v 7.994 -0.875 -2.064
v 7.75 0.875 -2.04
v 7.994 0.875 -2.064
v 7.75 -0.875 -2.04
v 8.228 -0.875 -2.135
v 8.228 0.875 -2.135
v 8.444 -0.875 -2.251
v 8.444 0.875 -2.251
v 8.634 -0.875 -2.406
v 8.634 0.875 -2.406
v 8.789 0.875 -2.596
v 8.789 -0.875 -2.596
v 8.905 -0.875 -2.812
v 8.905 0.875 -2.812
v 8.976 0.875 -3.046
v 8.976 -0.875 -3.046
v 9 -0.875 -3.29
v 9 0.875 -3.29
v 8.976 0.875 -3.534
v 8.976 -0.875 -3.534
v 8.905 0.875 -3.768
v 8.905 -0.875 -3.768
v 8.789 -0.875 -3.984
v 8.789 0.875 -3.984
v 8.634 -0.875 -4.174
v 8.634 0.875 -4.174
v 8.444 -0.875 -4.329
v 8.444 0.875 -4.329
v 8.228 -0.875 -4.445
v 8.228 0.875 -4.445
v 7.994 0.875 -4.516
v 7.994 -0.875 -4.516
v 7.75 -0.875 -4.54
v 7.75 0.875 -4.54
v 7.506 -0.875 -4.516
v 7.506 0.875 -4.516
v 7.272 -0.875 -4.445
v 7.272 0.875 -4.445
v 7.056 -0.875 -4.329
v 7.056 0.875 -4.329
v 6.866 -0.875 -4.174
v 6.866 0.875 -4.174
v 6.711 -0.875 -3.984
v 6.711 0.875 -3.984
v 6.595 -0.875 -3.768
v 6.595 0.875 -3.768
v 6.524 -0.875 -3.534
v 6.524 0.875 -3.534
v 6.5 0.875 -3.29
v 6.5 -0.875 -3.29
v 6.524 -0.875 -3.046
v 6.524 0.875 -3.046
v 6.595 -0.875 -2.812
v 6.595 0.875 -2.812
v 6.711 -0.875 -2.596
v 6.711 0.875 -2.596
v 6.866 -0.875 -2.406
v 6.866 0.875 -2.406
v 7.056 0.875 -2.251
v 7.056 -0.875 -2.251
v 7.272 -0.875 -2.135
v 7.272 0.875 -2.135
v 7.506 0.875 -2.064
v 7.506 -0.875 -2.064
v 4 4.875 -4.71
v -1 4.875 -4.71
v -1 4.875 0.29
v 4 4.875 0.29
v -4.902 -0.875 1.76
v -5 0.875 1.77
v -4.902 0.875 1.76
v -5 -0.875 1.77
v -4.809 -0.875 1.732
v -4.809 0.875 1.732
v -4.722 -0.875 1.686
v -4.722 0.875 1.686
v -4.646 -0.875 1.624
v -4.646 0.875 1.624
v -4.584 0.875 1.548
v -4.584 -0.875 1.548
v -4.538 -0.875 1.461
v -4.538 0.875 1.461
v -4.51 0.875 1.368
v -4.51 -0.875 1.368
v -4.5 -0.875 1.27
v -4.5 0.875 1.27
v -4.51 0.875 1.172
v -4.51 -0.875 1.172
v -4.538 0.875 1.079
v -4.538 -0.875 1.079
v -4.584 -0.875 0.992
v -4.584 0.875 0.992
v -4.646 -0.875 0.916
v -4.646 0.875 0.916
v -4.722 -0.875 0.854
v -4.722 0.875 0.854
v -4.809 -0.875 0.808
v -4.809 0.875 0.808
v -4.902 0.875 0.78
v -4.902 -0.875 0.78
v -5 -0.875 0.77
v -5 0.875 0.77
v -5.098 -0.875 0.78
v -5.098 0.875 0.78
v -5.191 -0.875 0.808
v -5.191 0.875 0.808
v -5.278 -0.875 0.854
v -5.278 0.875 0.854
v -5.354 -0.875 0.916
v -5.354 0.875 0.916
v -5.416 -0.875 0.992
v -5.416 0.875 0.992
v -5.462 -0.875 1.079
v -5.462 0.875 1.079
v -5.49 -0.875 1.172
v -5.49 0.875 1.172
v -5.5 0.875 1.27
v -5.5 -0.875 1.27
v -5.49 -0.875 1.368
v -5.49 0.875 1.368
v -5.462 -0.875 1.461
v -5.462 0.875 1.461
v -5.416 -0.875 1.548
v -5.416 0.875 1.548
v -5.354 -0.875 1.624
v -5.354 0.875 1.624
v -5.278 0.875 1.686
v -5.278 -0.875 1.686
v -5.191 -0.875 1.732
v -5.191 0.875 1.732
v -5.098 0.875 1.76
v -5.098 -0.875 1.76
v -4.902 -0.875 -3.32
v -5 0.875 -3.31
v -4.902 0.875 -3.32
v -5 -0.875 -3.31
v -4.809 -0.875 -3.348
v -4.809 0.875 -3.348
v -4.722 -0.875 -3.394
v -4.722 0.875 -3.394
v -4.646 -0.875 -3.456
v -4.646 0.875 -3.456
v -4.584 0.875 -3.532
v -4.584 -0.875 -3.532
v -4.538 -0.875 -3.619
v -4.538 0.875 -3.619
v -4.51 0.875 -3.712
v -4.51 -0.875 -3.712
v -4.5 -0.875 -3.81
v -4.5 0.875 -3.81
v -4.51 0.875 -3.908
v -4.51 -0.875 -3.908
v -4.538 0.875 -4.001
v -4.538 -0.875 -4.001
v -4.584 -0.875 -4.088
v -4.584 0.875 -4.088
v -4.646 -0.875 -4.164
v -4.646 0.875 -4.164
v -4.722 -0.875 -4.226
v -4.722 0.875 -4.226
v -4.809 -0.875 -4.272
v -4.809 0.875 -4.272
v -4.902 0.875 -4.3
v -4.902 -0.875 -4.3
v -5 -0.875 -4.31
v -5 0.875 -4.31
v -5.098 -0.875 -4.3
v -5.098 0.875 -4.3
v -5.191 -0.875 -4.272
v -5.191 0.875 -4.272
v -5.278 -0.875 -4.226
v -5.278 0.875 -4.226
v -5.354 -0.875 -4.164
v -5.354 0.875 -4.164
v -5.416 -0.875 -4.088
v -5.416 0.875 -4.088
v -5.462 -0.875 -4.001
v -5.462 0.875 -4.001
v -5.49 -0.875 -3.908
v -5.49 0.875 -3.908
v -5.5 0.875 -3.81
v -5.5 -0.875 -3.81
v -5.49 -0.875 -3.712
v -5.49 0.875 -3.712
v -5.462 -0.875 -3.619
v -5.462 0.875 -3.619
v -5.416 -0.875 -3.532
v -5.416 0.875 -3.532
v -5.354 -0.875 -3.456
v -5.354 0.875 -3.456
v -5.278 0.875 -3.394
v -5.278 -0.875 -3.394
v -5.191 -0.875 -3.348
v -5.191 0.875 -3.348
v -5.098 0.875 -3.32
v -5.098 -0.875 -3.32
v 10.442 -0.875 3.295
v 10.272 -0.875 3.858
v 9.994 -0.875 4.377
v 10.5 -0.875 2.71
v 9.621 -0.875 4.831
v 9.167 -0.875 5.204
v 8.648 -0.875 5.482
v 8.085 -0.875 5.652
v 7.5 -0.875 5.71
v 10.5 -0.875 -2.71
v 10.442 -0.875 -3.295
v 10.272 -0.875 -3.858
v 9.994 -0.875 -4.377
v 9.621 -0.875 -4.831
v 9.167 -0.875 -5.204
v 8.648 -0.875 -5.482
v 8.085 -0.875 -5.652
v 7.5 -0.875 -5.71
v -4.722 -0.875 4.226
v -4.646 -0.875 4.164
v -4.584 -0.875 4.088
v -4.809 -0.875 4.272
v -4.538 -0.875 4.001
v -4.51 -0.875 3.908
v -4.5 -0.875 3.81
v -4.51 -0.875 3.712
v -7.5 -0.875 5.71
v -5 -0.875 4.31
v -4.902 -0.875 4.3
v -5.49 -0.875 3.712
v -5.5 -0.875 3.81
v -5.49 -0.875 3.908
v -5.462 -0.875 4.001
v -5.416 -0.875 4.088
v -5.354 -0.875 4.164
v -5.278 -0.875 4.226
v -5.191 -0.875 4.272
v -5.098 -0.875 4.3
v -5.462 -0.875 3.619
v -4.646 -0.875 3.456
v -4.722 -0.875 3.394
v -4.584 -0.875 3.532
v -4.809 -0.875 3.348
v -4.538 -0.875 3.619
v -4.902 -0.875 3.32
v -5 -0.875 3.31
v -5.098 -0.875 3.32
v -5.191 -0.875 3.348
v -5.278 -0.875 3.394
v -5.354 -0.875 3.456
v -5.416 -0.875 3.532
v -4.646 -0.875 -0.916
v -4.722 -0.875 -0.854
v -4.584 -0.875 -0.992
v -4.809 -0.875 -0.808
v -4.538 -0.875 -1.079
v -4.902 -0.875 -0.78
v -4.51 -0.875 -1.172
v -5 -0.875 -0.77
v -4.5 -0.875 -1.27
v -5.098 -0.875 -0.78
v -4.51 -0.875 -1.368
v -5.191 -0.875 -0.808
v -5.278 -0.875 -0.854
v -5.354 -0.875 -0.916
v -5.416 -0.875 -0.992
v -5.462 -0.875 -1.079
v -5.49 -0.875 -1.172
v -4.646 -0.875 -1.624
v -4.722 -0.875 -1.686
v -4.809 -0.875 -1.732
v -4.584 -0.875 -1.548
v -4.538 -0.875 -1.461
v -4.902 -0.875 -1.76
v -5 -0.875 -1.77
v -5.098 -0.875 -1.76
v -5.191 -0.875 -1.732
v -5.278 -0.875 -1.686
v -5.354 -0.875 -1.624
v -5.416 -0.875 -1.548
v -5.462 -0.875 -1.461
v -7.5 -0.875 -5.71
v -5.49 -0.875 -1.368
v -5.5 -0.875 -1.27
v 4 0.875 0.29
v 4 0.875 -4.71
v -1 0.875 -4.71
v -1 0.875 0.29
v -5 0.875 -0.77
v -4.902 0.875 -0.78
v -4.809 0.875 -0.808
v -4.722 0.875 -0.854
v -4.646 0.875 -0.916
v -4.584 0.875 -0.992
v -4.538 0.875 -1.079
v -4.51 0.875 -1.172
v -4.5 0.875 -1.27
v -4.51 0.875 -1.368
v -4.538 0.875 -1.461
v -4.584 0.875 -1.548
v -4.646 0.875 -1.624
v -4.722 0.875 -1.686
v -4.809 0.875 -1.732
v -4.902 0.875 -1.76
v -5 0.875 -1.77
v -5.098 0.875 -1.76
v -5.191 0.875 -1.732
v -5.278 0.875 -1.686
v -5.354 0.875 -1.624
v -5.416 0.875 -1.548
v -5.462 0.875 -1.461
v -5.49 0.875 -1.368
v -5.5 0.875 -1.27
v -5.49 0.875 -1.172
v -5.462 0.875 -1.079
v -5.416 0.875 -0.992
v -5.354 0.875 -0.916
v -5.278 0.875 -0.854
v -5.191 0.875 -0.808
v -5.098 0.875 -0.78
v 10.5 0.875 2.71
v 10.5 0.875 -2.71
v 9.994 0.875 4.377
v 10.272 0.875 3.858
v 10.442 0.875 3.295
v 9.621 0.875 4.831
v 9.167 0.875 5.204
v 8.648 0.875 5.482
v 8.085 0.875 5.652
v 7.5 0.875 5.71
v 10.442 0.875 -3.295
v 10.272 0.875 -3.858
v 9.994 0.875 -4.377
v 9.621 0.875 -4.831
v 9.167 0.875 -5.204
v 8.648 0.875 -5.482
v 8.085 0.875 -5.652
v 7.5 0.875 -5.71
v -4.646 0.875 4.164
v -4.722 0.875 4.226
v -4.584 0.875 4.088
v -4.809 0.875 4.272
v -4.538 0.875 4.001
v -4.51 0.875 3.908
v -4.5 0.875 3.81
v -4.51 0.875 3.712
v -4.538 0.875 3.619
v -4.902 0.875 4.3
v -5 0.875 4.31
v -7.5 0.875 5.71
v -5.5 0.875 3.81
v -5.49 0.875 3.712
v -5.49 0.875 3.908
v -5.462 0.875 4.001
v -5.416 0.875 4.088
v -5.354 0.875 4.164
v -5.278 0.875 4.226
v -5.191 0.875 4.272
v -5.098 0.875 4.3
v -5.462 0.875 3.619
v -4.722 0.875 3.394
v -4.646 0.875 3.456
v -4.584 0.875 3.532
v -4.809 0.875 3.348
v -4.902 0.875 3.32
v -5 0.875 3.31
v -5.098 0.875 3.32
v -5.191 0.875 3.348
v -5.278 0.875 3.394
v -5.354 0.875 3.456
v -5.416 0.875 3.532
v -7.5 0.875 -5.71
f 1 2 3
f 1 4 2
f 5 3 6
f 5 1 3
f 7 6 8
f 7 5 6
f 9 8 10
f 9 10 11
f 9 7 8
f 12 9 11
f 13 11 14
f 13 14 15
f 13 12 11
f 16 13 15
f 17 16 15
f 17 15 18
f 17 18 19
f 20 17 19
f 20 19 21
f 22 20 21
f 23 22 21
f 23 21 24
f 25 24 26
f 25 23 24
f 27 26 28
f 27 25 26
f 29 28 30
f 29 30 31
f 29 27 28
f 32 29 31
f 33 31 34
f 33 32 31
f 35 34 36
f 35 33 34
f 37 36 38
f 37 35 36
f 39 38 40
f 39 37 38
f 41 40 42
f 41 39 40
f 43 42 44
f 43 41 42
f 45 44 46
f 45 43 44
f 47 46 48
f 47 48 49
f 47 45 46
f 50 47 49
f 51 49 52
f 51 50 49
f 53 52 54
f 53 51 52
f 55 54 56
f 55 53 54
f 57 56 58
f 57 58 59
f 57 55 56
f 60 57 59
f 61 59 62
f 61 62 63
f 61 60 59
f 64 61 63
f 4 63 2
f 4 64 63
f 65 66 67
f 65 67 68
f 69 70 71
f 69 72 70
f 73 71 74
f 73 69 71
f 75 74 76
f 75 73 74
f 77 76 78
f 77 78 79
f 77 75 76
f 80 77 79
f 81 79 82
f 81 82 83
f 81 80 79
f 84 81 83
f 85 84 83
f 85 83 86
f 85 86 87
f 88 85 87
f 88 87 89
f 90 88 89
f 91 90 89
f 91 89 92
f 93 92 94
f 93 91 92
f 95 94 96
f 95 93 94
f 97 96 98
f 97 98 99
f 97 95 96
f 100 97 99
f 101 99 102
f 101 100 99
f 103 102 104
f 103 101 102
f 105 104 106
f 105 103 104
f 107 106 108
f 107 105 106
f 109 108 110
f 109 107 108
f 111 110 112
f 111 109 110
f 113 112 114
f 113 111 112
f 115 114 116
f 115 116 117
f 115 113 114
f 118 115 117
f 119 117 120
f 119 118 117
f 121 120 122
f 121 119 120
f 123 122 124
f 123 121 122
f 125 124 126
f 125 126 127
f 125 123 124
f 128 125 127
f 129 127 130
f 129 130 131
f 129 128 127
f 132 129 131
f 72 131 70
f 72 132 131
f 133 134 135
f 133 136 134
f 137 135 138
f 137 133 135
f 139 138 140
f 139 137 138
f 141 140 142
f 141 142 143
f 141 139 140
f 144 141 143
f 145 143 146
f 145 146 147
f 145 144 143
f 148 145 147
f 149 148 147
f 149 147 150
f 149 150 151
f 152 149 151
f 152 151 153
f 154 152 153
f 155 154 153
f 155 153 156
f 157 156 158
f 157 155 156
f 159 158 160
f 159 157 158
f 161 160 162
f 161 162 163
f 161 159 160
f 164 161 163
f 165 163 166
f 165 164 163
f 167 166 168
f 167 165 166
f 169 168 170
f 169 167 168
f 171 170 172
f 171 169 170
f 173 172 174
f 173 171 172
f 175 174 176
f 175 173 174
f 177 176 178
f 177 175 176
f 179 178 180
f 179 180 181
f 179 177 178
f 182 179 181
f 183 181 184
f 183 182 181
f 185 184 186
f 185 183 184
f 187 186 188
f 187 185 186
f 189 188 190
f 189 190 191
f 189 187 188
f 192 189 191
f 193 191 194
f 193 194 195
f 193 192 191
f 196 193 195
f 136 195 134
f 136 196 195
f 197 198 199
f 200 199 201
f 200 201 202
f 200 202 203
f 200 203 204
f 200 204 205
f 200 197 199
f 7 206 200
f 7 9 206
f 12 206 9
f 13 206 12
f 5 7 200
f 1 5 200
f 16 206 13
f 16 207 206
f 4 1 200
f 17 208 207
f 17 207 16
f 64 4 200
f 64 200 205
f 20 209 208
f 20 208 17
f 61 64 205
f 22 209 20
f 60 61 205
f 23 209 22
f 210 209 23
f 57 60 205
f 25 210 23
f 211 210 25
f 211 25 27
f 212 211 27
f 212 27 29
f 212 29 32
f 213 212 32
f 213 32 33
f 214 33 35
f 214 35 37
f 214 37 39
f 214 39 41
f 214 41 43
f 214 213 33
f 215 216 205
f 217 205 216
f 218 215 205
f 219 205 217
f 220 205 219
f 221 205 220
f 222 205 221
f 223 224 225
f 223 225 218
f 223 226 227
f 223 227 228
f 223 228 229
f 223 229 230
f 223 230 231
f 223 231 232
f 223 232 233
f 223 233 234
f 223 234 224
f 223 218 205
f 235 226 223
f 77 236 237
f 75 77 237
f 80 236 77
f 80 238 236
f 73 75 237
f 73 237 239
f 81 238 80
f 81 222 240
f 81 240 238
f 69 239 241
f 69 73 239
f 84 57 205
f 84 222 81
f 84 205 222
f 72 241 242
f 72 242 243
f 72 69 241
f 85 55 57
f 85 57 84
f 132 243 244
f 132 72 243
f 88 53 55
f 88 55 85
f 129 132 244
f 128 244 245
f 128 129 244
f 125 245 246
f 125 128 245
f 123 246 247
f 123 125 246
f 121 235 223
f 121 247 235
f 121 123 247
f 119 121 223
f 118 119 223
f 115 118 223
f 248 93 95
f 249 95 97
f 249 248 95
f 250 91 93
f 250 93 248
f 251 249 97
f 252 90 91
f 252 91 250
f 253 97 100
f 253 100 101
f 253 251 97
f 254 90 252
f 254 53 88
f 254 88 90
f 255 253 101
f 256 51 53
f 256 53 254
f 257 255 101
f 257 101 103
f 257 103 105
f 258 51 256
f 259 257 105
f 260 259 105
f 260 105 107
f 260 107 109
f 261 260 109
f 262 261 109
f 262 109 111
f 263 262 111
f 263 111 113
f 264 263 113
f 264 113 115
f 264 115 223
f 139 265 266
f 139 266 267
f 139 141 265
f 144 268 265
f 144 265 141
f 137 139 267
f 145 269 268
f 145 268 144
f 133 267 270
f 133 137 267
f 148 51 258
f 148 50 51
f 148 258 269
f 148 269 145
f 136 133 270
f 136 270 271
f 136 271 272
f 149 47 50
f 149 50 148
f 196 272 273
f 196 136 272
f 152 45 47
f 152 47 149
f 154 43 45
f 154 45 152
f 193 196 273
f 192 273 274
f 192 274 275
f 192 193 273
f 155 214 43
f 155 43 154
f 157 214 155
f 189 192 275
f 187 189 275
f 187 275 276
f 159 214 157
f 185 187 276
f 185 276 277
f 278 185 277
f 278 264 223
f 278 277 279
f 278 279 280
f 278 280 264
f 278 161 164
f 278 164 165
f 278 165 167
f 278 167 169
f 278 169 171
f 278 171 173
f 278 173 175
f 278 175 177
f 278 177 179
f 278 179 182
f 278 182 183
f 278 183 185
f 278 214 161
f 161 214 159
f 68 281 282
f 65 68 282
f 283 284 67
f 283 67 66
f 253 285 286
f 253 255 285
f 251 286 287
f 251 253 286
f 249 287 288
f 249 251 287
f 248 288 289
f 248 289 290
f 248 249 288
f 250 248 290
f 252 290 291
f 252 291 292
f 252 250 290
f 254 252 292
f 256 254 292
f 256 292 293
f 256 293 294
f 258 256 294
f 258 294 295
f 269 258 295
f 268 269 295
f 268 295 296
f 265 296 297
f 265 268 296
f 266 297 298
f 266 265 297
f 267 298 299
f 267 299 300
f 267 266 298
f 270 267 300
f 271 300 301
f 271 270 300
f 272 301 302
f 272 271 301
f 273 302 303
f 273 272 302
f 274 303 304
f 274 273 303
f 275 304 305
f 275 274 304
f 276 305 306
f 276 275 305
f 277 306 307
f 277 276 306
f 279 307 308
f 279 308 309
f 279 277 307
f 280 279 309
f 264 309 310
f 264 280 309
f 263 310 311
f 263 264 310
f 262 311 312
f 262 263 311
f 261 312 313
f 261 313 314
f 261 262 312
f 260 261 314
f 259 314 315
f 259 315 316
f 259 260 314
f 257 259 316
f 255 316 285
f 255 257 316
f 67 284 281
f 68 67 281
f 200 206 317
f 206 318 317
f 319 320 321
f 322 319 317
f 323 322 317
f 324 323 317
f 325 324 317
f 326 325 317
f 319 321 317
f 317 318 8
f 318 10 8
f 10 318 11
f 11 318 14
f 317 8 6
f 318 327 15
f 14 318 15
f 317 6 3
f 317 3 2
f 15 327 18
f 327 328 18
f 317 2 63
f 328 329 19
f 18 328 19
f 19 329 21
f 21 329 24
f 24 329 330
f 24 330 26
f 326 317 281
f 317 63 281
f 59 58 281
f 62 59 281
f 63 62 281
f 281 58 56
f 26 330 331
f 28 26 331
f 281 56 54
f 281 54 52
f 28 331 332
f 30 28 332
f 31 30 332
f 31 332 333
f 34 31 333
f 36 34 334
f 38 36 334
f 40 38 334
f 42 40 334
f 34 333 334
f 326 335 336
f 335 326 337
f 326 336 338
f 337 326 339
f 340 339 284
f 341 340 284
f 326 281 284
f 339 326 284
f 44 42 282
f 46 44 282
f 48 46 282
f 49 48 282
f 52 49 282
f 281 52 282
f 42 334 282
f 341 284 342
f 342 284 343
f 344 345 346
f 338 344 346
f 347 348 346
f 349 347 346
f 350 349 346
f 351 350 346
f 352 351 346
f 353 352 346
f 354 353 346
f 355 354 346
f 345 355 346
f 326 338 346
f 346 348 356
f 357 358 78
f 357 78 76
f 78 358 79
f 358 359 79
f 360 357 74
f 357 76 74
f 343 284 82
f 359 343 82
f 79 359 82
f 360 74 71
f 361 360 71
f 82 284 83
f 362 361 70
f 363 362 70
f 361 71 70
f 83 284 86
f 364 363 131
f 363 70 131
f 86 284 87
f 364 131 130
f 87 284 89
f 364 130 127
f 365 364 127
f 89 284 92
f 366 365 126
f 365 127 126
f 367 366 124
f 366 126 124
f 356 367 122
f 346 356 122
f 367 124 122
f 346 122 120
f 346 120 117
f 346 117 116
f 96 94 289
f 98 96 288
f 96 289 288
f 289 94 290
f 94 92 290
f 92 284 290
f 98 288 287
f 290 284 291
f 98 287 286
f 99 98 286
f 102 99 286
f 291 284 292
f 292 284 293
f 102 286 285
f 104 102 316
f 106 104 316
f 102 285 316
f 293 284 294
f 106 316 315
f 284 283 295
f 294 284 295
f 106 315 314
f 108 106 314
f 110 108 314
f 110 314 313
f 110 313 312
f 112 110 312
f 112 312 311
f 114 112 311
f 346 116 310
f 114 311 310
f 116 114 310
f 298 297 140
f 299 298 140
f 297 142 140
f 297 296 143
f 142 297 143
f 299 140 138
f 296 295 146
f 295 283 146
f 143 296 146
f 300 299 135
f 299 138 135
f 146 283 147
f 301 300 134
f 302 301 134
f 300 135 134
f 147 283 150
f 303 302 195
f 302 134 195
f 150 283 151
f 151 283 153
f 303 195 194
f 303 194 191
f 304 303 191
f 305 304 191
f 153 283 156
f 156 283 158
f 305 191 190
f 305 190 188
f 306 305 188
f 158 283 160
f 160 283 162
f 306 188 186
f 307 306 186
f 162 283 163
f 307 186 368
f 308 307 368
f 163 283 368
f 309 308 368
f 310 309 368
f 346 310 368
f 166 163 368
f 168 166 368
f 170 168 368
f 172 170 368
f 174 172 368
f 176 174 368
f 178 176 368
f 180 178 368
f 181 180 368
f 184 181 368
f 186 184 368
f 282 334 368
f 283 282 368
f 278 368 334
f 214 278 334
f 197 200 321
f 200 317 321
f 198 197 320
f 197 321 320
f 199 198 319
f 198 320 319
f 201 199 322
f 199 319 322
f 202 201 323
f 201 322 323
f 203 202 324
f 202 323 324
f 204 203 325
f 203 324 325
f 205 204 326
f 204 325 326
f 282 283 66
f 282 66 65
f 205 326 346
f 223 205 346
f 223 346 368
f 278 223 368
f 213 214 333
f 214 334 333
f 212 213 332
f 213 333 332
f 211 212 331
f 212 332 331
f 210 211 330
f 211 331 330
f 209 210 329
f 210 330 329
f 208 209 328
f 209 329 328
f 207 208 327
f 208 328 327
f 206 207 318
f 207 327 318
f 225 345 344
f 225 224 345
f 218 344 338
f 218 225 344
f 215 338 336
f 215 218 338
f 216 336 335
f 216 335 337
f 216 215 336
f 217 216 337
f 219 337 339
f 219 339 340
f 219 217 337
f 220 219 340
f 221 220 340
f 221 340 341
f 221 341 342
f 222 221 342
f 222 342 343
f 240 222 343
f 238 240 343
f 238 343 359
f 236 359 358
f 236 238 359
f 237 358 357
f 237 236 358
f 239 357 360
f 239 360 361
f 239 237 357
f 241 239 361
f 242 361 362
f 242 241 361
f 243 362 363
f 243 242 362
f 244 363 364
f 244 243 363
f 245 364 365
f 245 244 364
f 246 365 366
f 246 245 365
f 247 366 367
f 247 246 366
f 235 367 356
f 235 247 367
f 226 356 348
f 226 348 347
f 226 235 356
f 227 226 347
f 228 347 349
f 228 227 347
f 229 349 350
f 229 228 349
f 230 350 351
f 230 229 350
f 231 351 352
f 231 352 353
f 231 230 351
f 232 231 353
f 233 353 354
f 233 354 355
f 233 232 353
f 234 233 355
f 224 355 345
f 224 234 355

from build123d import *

# Parameters (mm, degrees)
SKETCH1_R           = 1.25
SKETCH1_R_2         = 0.5
BOSS_EXTRUDE1_DEPTH = 0.875
SKETCH2_W           = 5
SKETCH2_H           = 5
BOSS_EXTRUDE2_DEPTH = 4


with BuildPart() as part:
    # Sketch1 → Boss-Extrude1 (new, symmetric)
    with BuildSketch(Plane(origin=(0, 0, 0), x_dir=(1, 0, 0), z_dir=(0, 1, 0))):
        with BuildLine():
            Line((-7.5, 5.71), (7.5, 5.71))
            ThreePointArc((7.5, 5.71), (9.621320344, 4.831320344), (10.5, 2.71))
            Line((10.5, 2.71), (10.5, -2.71))
            ThreePointArc((10.5, -2.71), (9.621320344, -4.831320344), (7.5, -5.71))
            Line((7.5, -5.71), (-7.5, -5.71))
            Line((-7.5, -5.71), (-7.5, 5.71))
        make_face()
        with Locations(Location((7.75, 3.29, 0), (0, 0, 270))):
            Circle(SKETCH1_R, mode=Mode.SUBTRACT)
        with Locations(Location((-5, 3.81, 0), (0, 0, 270))):
            Circle(SKETCH1_R_2, mode=Mode.SUBTRACT)
        with Locations(Location((-5, 1.27, 0), (0, 0, 270))):
            Circle(SKETCH1_R_2, mode=Mode.SUBTRACT)
        with Locations(Location((-5, -1.27, 0), (0, 0, 270))):
            Circle(SKETCH1_R_2, mode=Mode.SUBTRACT)
        with Locations(Location((-5, -3.81, 0), (0, 0, 270))):
            Circle(SKETCH1_R_2, mode=Mode.SUBTRACT)
    extrude(amount=BOSS_EXTRUDE1_DEPTH, both=True)

    # Sketch2 → Boss-Extrude2 (add)
    with BuildSketch(Plane(origin=(0, 0.875, 0), x_dir=(1, 0, 0), z_dir=(0, 1, 0))):
        with Locations((1.5, 2.21)):
            Rectangle(SKETCH2_W, SKETCH2_H)
    extrude(amount=BOSS_EXTRUDE2_DEPTH)


solid = part.part
